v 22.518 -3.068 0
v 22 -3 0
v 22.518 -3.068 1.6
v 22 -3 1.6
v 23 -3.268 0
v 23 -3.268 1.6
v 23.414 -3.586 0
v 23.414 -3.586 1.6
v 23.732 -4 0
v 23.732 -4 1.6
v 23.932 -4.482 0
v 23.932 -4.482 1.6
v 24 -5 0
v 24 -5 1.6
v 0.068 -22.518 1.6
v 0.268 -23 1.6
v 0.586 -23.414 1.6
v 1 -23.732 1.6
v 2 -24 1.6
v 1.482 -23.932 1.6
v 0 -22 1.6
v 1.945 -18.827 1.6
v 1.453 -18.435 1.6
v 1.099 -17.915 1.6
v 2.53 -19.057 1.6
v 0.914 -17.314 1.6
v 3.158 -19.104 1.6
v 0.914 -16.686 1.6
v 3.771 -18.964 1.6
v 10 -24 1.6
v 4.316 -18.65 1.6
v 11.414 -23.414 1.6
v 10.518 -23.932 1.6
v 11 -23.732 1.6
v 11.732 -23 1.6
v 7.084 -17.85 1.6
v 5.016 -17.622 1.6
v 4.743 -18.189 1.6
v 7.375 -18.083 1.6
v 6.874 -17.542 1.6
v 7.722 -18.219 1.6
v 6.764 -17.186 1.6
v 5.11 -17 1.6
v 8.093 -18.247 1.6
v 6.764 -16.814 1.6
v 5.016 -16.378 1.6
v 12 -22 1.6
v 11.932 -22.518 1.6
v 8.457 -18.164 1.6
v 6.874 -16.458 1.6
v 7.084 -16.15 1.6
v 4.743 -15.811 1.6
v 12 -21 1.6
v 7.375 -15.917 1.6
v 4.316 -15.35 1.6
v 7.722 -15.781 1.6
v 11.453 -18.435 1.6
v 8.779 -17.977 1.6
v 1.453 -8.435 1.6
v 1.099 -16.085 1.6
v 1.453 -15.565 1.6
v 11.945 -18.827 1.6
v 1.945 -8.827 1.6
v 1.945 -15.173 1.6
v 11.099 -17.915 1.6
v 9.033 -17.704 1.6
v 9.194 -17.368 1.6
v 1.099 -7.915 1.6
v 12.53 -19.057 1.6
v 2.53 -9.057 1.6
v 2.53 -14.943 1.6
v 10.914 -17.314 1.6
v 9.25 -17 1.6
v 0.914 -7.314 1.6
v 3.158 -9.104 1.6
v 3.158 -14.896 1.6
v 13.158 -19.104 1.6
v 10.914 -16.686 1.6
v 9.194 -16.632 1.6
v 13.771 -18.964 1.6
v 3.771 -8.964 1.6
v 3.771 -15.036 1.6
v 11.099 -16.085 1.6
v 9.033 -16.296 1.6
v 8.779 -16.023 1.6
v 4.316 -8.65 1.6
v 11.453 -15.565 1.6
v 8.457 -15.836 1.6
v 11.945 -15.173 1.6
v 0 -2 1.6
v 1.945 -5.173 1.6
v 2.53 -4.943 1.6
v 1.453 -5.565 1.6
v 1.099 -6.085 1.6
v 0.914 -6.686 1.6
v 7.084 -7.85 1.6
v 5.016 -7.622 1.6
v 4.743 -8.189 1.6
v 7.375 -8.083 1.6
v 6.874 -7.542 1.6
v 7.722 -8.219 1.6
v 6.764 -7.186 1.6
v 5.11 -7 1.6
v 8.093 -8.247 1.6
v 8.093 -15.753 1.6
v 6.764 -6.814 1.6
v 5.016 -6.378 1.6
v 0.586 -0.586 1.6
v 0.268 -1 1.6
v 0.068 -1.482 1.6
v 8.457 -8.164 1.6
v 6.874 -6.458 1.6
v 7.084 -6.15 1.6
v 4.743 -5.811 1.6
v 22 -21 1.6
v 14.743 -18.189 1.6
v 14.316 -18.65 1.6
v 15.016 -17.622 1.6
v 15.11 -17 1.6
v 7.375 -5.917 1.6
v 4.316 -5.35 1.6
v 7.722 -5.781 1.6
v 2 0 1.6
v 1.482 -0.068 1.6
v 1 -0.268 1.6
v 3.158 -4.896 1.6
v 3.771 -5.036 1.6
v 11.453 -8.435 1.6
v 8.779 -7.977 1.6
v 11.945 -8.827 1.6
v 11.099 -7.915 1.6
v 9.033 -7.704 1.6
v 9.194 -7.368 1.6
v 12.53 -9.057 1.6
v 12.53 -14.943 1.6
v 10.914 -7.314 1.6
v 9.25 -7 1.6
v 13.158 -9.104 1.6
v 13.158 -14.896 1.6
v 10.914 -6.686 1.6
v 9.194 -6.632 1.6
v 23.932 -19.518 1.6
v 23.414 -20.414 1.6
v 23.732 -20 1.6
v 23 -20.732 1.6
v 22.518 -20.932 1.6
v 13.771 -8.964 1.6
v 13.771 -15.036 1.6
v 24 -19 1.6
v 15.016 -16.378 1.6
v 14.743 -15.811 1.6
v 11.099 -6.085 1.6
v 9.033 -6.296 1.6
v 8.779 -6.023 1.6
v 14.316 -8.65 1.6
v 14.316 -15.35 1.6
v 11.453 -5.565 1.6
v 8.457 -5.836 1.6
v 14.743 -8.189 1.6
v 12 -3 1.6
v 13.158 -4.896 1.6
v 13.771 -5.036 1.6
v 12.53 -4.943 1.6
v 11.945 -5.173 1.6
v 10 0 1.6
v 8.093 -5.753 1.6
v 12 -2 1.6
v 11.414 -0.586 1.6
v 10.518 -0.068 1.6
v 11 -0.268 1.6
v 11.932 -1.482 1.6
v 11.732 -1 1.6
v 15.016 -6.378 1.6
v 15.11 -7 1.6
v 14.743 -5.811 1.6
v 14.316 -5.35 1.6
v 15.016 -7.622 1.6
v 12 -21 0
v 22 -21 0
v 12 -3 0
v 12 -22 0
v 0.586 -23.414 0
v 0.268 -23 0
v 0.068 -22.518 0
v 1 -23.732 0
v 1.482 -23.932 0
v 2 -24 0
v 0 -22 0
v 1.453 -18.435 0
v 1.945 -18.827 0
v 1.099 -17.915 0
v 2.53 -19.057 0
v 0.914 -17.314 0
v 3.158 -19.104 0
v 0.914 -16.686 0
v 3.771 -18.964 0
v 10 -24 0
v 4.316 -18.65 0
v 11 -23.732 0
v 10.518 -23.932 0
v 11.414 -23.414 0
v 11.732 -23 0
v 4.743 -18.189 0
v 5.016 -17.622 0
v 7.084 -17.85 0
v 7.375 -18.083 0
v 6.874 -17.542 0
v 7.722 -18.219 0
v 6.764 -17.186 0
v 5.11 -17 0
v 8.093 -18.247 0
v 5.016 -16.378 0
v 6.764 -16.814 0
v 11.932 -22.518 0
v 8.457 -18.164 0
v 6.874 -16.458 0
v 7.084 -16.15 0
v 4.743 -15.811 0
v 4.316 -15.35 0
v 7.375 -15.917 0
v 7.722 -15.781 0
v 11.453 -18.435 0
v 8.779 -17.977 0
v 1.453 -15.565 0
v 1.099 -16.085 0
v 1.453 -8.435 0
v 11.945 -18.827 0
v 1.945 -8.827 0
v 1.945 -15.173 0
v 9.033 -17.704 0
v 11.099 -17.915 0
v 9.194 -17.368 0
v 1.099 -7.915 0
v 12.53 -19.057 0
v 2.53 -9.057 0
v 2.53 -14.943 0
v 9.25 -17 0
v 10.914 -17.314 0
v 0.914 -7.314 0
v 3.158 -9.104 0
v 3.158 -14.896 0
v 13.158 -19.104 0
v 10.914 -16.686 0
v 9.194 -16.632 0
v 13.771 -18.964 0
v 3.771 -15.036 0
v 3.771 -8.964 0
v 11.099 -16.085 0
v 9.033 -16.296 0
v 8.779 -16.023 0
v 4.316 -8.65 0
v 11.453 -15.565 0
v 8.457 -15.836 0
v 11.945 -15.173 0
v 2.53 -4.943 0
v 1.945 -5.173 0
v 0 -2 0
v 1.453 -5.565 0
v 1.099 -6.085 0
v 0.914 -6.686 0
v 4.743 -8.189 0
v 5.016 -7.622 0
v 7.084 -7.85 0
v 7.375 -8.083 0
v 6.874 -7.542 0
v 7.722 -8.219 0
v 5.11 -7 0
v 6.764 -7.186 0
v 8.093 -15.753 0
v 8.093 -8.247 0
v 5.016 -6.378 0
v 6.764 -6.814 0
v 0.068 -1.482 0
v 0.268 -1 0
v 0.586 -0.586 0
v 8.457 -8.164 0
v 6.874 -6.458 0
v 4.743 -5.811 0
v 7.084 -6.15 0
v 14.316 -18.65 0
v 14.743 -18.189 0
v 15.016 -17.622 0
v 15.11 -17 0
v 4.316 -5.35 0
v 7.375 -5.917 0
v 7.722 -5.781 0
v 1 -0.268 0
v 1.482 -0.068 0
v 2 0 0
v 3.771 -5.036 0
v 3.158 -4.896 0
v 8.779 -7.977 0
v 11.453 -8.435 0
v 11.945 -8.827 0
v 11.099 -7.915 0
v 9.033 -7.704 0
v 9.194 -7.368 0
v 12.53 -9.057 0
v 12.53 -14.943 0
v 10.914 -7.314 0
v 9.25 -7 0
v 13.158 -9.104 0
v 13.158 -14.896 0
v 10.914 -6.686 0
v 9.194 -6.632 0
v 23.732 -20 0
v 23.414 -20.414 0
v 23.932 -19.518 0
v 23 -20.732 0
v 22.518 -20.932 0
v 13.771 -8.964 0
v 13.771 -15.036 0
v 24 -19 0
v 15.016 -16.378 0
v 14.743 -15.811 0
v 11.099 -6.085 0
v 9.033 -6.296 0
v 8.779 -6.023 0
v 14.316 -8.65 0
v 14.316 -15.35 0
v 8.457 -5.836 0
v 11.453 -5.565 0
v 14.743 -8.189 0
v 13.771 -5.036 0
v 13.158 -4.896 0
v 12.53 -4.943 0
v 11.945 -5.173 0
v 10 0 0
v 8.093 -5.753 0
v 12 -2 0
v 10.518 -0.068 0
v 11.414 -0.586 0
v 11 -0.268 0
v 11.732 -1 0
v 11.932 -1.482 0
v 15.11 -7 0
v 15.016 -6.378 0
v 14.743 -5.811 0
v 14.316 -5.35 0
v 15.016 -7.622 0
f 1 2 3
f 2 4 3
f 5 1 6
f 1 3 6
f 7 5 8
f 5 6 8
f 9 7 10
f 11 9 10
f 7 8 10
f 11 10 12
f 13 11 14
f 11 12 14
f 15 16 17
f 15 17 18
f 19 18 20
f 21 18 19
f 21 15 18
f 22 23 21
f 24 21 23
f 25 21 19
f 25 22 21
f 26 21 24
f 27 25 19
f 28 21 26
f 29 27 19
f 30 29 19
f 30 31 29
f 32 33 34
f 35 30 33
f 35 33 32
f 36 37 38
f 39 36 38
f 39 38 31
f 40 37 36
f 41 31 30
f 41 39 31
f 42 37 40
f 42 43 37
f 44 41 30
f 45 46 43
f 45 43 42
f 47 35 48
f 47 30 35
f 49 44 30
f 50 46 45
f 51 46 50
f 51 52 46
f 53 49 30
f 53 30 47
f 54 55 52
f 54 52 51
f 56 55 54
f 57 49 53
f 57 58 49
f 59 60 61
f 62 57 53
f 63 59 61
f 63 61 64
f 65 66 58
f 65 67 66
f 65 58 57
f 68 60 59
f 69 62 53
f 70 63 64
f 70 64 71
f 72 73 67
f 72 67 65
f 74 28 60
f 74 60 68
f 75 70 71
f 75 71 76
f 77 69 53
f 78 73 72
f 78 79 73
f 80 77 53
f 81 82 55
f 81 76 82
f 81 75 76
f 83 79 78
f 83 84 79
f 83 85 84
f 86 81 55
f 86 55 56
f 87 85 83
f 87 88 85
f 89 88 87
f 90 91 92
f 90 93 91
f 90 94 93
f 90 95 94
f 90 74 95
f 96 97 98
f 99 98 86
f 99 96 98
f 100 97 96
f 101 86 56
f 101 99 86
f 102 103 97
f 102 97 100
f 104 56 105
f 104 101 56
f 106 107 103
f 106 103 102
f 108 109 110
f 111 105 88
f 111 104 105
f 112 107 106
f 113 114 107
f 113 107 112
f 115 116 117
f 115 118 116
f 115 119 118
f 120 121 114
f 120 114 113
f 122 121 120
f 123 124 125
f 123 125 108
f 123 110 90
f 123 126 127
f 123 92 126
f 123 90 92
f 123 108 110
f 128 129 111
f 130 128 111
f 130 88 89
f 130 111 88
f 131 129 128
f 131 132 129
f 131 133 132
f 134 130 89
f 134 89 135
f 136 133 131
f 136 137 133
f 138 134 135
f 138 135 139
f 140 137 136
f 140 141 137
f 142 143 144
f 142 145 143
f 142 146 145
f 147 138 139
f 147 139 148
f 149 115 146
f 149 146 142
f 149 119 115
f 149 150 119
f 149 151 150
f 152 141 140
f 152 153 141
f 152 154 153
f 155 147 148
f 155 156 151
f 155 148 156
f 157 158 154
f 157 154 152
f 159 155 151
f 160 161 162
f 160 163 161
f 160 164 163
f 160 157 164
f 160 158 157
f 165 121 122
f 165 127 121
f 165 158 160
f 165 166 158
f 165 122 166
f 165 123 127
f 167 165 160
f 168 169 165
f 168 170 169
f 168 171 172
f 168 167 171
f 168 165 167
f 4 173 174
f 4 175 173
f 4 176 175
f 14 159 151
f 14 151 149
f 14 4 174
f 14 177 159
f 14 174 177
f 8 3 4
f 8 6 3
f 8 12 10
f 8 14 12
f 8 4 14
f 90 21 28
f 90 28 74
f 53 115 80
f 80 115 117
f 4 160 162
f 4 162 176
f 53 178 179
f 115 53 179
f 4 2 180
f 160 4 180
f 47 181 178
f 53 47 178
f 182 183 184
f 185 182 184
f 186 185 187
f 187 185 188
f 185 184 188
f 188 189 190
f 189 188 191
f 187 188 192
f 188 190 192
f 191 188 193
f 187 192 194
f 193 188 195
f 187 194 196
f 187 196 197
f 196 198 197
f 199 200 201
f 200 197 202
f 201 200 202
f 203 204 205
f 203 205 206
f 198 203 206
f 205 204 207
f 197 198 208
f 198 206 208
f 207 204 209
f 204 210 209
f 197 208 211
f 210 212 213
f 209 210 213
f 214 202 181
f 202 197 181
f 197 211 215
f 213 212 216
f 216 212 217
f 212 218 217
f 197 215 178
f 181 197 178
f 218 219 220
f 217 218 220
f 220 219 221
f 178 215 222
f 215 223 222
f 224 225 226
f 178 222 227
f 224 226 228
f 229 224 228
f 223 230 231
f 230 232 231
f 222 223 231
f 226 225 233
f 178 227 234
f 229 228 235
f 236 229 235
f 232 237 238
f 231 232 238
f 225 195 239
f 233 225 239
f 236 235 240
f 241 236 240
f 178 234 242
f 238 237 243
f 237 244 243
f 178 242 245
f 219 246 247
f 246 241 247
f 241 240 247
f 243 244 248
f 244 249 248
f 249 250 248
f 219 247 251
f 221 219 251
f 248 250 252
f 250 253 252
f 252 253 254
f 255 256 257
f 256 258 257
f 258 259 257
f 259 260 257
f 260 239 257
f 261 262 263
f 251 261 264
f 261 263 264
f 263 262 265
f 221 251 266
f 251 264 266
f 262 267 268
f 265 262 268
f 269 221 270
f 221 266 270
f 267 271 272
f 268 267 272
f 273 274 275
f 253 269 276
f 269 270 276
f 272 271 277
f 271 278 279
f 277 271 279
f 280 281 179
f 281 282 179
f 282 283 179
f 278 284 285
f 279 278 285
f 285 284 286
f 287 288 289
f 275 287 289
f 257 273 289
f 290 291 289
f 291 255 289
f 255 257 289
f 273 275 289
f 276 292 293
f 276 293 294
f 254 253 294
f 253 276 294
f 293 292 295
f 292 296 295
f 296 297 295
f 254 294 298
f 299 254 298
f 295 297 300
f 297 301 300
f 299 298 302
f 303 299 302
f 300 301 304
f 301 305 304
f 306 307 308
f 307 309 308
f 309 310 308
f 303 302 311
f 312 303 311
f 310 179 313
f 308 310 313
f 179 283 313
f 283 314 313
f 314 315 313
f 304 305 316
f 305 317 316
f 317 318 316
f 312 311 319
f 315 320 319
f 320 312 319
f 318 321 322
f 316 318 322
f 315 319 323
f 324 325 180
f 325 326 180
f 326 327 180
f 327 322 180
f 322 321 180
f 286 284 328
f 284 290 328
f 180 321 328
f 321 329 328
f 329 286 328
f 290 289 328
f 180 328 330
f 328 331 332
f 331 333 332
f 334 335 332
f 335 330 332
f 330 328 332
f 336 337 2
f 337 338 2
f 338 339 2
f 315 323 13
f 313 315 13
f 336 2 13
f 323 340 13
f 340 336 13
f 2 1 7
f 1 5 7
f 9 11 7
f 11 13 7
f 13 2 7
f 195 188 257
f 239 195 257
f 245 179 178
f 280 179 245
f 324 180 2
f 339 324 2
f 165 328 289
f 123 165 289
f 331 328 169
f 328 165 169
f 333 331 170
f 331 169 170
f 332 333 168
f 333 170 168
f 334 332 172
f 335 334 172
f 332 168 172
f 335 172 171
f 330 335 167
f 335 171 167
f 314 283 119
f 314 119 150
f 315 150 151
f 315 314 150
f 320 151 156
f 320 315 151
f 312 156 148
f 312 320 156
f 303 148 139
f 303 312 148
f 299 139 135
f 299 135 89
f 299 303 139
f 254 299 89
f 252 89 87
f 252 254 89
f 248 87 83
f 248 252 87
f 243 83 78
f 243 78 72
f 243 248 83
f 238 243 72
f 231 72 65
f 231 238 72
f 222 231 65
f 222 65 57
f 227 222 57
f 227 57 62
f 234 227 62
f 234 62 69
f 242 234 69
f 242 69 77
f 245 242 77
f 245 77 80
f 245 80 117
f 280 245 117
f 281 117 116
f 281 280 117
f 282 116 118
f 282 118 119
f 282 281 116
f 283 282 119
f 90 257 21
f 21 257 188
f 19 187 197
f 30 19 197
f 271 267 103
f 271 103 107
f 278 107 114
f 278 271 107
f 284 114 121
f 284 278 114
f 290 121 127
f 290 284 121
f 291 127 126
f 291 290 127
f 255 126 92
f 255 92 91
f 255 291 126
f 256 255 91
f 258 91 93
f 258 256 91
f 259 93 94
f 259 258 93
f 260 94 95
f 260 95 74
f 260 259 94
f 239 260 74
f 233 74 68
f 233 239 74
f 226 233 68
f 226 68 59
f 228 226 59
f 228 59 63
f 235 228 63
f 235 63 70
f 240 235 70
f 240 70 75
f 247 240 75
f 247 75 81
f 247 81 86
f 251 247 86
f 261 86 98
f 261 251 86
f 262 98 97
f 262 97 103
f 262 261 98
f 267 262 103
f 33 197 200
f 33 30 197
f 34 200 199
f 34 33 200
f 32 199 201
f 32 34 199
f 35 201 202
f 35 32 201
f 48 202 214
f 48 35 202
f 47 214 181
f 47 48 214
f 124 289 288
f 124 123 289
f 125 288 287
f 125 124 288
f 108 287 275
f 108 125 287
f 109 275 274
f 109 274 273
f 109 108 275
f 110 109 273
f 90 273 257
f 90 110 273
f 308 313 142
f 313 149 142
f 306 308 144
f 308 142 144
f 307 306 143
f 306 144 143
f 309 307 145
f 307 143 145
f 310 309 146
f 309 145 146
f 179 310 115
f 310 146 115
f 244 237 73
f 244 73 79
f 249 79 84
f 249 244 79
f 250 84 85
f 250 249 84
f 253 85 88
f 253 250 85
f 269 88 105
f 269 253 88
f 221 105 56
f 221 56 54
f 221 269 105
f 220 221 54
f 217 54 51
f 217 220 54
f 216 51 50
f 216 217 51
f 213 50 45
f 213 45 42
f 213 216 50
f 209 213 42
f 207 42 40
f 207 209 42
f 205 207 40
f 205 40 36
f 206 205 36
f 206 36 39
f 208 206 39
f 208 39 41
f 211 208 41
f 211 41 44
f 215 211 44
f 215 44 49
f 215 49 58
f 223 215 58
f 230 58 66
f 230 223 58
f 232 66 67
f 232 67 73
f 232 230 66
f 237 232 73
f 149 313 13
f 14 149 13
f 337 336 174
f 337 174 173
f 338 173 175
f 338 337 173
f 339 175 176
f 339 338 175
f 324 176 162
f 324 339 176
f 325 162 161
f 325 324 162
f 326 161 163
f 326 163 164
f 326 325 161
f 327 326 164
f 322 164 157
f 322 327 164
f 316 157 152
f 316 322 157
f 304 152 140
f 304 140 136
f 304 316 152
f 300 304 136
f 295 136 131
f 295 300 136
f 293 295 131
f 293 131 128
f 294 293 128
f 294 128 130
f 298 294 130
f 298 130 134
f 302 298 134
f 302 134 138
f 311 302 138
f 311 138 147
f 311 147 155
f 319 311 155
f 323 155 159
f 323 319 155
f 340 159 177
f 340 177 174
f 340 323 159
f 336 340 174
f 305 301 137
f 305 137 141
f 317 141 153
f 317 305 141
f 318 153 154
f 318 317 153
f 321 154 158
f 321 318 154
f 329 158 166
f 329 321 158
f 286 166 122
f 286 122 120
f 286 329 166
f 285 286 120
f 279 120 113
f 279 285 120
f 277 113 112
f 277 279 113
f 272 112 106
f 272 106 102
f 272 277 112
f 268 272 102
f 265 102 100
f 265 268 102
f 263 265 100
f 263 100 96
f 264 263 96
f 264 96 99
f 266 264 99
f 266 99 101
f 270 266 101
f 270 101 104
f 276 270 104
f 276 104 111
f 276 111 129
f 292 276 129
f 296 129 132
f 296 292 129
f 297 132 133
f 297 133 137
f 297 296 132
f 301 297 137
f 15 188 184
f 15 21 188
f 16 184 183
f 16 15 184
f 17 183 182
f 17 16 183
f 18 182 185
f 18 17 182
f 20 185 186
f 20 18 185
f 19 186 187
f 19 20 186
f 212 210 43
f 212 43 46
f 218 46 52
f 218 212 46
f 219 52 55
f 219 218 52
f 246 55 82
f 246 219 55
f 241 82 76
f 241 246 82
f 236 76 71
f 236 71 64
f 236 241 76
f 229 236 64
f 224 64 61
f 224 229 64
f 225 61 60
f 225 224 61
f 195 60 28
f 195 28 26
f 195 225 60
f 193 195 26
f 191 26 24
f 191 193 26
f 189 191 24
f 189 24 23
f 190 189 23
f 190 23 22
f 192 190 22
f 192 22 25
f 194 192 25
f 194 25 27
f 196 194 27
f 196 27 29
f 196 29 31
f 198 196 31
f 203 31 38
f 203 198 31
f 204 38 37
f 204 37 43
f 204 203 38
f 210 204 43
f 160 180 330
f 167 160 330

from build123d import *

# Parameters (mm, degrees)
SKETCH_1_R      = 2.11
SKETCH_1_R_2    = 1.25
EXTRUDE_1_DEPTH = 1.6
FILLET_1_R      = 2


with BuildPart() as part:
    # 草图1 → 凸台-拉伸1 (new body)
    with BuildSketch(Plane.XY):
        Polygon((12, 0), (0, 0), (0, -24), (12, -24), (12, -21), (24, -21), (24, -3), (12, -3), align=None)
        with Locations((13, -7)):
            Circle(SKETCH_1_R, mode=Mode.SUBTRACT)
        with Locations((13, -17)):
            Circle(SKETCH_1_R, mode=Mode.SUBTRACT)
        with Locations((3, -17)):
            Circle(SKETCH_1_R, mode=Mode.SUBTRACT)
        with Locations((8, -17)):
            Circle(SKETCH_1_R_2, mode=Mode.SUBTRACT)
        with Locations((3, -7)):
            Circle(SKETCH_1_R, mode=Mode.SUBTRACT)
        with Locations((8, -7)):
            Circle(SKETCH_1_R_2, mode=Mode.SUBTRACT)
    extrude(amount=EXTRUDE_1_DEPTH)

    # 圆角1
    fillet_1_edges = [part.edges().sort_by_distance(p)[0] for p in [
        (12, -24, 0.8),
        (0, -24, 0.8),
        (0, 0, 0.8),
        (12, 0, 0.8),
        (24, -3, 0.8),
        (24, -21, 0.8),
    ]]
    fillet(fillet_1_edges, radius=FILLET_1_R)


solid = part.part
